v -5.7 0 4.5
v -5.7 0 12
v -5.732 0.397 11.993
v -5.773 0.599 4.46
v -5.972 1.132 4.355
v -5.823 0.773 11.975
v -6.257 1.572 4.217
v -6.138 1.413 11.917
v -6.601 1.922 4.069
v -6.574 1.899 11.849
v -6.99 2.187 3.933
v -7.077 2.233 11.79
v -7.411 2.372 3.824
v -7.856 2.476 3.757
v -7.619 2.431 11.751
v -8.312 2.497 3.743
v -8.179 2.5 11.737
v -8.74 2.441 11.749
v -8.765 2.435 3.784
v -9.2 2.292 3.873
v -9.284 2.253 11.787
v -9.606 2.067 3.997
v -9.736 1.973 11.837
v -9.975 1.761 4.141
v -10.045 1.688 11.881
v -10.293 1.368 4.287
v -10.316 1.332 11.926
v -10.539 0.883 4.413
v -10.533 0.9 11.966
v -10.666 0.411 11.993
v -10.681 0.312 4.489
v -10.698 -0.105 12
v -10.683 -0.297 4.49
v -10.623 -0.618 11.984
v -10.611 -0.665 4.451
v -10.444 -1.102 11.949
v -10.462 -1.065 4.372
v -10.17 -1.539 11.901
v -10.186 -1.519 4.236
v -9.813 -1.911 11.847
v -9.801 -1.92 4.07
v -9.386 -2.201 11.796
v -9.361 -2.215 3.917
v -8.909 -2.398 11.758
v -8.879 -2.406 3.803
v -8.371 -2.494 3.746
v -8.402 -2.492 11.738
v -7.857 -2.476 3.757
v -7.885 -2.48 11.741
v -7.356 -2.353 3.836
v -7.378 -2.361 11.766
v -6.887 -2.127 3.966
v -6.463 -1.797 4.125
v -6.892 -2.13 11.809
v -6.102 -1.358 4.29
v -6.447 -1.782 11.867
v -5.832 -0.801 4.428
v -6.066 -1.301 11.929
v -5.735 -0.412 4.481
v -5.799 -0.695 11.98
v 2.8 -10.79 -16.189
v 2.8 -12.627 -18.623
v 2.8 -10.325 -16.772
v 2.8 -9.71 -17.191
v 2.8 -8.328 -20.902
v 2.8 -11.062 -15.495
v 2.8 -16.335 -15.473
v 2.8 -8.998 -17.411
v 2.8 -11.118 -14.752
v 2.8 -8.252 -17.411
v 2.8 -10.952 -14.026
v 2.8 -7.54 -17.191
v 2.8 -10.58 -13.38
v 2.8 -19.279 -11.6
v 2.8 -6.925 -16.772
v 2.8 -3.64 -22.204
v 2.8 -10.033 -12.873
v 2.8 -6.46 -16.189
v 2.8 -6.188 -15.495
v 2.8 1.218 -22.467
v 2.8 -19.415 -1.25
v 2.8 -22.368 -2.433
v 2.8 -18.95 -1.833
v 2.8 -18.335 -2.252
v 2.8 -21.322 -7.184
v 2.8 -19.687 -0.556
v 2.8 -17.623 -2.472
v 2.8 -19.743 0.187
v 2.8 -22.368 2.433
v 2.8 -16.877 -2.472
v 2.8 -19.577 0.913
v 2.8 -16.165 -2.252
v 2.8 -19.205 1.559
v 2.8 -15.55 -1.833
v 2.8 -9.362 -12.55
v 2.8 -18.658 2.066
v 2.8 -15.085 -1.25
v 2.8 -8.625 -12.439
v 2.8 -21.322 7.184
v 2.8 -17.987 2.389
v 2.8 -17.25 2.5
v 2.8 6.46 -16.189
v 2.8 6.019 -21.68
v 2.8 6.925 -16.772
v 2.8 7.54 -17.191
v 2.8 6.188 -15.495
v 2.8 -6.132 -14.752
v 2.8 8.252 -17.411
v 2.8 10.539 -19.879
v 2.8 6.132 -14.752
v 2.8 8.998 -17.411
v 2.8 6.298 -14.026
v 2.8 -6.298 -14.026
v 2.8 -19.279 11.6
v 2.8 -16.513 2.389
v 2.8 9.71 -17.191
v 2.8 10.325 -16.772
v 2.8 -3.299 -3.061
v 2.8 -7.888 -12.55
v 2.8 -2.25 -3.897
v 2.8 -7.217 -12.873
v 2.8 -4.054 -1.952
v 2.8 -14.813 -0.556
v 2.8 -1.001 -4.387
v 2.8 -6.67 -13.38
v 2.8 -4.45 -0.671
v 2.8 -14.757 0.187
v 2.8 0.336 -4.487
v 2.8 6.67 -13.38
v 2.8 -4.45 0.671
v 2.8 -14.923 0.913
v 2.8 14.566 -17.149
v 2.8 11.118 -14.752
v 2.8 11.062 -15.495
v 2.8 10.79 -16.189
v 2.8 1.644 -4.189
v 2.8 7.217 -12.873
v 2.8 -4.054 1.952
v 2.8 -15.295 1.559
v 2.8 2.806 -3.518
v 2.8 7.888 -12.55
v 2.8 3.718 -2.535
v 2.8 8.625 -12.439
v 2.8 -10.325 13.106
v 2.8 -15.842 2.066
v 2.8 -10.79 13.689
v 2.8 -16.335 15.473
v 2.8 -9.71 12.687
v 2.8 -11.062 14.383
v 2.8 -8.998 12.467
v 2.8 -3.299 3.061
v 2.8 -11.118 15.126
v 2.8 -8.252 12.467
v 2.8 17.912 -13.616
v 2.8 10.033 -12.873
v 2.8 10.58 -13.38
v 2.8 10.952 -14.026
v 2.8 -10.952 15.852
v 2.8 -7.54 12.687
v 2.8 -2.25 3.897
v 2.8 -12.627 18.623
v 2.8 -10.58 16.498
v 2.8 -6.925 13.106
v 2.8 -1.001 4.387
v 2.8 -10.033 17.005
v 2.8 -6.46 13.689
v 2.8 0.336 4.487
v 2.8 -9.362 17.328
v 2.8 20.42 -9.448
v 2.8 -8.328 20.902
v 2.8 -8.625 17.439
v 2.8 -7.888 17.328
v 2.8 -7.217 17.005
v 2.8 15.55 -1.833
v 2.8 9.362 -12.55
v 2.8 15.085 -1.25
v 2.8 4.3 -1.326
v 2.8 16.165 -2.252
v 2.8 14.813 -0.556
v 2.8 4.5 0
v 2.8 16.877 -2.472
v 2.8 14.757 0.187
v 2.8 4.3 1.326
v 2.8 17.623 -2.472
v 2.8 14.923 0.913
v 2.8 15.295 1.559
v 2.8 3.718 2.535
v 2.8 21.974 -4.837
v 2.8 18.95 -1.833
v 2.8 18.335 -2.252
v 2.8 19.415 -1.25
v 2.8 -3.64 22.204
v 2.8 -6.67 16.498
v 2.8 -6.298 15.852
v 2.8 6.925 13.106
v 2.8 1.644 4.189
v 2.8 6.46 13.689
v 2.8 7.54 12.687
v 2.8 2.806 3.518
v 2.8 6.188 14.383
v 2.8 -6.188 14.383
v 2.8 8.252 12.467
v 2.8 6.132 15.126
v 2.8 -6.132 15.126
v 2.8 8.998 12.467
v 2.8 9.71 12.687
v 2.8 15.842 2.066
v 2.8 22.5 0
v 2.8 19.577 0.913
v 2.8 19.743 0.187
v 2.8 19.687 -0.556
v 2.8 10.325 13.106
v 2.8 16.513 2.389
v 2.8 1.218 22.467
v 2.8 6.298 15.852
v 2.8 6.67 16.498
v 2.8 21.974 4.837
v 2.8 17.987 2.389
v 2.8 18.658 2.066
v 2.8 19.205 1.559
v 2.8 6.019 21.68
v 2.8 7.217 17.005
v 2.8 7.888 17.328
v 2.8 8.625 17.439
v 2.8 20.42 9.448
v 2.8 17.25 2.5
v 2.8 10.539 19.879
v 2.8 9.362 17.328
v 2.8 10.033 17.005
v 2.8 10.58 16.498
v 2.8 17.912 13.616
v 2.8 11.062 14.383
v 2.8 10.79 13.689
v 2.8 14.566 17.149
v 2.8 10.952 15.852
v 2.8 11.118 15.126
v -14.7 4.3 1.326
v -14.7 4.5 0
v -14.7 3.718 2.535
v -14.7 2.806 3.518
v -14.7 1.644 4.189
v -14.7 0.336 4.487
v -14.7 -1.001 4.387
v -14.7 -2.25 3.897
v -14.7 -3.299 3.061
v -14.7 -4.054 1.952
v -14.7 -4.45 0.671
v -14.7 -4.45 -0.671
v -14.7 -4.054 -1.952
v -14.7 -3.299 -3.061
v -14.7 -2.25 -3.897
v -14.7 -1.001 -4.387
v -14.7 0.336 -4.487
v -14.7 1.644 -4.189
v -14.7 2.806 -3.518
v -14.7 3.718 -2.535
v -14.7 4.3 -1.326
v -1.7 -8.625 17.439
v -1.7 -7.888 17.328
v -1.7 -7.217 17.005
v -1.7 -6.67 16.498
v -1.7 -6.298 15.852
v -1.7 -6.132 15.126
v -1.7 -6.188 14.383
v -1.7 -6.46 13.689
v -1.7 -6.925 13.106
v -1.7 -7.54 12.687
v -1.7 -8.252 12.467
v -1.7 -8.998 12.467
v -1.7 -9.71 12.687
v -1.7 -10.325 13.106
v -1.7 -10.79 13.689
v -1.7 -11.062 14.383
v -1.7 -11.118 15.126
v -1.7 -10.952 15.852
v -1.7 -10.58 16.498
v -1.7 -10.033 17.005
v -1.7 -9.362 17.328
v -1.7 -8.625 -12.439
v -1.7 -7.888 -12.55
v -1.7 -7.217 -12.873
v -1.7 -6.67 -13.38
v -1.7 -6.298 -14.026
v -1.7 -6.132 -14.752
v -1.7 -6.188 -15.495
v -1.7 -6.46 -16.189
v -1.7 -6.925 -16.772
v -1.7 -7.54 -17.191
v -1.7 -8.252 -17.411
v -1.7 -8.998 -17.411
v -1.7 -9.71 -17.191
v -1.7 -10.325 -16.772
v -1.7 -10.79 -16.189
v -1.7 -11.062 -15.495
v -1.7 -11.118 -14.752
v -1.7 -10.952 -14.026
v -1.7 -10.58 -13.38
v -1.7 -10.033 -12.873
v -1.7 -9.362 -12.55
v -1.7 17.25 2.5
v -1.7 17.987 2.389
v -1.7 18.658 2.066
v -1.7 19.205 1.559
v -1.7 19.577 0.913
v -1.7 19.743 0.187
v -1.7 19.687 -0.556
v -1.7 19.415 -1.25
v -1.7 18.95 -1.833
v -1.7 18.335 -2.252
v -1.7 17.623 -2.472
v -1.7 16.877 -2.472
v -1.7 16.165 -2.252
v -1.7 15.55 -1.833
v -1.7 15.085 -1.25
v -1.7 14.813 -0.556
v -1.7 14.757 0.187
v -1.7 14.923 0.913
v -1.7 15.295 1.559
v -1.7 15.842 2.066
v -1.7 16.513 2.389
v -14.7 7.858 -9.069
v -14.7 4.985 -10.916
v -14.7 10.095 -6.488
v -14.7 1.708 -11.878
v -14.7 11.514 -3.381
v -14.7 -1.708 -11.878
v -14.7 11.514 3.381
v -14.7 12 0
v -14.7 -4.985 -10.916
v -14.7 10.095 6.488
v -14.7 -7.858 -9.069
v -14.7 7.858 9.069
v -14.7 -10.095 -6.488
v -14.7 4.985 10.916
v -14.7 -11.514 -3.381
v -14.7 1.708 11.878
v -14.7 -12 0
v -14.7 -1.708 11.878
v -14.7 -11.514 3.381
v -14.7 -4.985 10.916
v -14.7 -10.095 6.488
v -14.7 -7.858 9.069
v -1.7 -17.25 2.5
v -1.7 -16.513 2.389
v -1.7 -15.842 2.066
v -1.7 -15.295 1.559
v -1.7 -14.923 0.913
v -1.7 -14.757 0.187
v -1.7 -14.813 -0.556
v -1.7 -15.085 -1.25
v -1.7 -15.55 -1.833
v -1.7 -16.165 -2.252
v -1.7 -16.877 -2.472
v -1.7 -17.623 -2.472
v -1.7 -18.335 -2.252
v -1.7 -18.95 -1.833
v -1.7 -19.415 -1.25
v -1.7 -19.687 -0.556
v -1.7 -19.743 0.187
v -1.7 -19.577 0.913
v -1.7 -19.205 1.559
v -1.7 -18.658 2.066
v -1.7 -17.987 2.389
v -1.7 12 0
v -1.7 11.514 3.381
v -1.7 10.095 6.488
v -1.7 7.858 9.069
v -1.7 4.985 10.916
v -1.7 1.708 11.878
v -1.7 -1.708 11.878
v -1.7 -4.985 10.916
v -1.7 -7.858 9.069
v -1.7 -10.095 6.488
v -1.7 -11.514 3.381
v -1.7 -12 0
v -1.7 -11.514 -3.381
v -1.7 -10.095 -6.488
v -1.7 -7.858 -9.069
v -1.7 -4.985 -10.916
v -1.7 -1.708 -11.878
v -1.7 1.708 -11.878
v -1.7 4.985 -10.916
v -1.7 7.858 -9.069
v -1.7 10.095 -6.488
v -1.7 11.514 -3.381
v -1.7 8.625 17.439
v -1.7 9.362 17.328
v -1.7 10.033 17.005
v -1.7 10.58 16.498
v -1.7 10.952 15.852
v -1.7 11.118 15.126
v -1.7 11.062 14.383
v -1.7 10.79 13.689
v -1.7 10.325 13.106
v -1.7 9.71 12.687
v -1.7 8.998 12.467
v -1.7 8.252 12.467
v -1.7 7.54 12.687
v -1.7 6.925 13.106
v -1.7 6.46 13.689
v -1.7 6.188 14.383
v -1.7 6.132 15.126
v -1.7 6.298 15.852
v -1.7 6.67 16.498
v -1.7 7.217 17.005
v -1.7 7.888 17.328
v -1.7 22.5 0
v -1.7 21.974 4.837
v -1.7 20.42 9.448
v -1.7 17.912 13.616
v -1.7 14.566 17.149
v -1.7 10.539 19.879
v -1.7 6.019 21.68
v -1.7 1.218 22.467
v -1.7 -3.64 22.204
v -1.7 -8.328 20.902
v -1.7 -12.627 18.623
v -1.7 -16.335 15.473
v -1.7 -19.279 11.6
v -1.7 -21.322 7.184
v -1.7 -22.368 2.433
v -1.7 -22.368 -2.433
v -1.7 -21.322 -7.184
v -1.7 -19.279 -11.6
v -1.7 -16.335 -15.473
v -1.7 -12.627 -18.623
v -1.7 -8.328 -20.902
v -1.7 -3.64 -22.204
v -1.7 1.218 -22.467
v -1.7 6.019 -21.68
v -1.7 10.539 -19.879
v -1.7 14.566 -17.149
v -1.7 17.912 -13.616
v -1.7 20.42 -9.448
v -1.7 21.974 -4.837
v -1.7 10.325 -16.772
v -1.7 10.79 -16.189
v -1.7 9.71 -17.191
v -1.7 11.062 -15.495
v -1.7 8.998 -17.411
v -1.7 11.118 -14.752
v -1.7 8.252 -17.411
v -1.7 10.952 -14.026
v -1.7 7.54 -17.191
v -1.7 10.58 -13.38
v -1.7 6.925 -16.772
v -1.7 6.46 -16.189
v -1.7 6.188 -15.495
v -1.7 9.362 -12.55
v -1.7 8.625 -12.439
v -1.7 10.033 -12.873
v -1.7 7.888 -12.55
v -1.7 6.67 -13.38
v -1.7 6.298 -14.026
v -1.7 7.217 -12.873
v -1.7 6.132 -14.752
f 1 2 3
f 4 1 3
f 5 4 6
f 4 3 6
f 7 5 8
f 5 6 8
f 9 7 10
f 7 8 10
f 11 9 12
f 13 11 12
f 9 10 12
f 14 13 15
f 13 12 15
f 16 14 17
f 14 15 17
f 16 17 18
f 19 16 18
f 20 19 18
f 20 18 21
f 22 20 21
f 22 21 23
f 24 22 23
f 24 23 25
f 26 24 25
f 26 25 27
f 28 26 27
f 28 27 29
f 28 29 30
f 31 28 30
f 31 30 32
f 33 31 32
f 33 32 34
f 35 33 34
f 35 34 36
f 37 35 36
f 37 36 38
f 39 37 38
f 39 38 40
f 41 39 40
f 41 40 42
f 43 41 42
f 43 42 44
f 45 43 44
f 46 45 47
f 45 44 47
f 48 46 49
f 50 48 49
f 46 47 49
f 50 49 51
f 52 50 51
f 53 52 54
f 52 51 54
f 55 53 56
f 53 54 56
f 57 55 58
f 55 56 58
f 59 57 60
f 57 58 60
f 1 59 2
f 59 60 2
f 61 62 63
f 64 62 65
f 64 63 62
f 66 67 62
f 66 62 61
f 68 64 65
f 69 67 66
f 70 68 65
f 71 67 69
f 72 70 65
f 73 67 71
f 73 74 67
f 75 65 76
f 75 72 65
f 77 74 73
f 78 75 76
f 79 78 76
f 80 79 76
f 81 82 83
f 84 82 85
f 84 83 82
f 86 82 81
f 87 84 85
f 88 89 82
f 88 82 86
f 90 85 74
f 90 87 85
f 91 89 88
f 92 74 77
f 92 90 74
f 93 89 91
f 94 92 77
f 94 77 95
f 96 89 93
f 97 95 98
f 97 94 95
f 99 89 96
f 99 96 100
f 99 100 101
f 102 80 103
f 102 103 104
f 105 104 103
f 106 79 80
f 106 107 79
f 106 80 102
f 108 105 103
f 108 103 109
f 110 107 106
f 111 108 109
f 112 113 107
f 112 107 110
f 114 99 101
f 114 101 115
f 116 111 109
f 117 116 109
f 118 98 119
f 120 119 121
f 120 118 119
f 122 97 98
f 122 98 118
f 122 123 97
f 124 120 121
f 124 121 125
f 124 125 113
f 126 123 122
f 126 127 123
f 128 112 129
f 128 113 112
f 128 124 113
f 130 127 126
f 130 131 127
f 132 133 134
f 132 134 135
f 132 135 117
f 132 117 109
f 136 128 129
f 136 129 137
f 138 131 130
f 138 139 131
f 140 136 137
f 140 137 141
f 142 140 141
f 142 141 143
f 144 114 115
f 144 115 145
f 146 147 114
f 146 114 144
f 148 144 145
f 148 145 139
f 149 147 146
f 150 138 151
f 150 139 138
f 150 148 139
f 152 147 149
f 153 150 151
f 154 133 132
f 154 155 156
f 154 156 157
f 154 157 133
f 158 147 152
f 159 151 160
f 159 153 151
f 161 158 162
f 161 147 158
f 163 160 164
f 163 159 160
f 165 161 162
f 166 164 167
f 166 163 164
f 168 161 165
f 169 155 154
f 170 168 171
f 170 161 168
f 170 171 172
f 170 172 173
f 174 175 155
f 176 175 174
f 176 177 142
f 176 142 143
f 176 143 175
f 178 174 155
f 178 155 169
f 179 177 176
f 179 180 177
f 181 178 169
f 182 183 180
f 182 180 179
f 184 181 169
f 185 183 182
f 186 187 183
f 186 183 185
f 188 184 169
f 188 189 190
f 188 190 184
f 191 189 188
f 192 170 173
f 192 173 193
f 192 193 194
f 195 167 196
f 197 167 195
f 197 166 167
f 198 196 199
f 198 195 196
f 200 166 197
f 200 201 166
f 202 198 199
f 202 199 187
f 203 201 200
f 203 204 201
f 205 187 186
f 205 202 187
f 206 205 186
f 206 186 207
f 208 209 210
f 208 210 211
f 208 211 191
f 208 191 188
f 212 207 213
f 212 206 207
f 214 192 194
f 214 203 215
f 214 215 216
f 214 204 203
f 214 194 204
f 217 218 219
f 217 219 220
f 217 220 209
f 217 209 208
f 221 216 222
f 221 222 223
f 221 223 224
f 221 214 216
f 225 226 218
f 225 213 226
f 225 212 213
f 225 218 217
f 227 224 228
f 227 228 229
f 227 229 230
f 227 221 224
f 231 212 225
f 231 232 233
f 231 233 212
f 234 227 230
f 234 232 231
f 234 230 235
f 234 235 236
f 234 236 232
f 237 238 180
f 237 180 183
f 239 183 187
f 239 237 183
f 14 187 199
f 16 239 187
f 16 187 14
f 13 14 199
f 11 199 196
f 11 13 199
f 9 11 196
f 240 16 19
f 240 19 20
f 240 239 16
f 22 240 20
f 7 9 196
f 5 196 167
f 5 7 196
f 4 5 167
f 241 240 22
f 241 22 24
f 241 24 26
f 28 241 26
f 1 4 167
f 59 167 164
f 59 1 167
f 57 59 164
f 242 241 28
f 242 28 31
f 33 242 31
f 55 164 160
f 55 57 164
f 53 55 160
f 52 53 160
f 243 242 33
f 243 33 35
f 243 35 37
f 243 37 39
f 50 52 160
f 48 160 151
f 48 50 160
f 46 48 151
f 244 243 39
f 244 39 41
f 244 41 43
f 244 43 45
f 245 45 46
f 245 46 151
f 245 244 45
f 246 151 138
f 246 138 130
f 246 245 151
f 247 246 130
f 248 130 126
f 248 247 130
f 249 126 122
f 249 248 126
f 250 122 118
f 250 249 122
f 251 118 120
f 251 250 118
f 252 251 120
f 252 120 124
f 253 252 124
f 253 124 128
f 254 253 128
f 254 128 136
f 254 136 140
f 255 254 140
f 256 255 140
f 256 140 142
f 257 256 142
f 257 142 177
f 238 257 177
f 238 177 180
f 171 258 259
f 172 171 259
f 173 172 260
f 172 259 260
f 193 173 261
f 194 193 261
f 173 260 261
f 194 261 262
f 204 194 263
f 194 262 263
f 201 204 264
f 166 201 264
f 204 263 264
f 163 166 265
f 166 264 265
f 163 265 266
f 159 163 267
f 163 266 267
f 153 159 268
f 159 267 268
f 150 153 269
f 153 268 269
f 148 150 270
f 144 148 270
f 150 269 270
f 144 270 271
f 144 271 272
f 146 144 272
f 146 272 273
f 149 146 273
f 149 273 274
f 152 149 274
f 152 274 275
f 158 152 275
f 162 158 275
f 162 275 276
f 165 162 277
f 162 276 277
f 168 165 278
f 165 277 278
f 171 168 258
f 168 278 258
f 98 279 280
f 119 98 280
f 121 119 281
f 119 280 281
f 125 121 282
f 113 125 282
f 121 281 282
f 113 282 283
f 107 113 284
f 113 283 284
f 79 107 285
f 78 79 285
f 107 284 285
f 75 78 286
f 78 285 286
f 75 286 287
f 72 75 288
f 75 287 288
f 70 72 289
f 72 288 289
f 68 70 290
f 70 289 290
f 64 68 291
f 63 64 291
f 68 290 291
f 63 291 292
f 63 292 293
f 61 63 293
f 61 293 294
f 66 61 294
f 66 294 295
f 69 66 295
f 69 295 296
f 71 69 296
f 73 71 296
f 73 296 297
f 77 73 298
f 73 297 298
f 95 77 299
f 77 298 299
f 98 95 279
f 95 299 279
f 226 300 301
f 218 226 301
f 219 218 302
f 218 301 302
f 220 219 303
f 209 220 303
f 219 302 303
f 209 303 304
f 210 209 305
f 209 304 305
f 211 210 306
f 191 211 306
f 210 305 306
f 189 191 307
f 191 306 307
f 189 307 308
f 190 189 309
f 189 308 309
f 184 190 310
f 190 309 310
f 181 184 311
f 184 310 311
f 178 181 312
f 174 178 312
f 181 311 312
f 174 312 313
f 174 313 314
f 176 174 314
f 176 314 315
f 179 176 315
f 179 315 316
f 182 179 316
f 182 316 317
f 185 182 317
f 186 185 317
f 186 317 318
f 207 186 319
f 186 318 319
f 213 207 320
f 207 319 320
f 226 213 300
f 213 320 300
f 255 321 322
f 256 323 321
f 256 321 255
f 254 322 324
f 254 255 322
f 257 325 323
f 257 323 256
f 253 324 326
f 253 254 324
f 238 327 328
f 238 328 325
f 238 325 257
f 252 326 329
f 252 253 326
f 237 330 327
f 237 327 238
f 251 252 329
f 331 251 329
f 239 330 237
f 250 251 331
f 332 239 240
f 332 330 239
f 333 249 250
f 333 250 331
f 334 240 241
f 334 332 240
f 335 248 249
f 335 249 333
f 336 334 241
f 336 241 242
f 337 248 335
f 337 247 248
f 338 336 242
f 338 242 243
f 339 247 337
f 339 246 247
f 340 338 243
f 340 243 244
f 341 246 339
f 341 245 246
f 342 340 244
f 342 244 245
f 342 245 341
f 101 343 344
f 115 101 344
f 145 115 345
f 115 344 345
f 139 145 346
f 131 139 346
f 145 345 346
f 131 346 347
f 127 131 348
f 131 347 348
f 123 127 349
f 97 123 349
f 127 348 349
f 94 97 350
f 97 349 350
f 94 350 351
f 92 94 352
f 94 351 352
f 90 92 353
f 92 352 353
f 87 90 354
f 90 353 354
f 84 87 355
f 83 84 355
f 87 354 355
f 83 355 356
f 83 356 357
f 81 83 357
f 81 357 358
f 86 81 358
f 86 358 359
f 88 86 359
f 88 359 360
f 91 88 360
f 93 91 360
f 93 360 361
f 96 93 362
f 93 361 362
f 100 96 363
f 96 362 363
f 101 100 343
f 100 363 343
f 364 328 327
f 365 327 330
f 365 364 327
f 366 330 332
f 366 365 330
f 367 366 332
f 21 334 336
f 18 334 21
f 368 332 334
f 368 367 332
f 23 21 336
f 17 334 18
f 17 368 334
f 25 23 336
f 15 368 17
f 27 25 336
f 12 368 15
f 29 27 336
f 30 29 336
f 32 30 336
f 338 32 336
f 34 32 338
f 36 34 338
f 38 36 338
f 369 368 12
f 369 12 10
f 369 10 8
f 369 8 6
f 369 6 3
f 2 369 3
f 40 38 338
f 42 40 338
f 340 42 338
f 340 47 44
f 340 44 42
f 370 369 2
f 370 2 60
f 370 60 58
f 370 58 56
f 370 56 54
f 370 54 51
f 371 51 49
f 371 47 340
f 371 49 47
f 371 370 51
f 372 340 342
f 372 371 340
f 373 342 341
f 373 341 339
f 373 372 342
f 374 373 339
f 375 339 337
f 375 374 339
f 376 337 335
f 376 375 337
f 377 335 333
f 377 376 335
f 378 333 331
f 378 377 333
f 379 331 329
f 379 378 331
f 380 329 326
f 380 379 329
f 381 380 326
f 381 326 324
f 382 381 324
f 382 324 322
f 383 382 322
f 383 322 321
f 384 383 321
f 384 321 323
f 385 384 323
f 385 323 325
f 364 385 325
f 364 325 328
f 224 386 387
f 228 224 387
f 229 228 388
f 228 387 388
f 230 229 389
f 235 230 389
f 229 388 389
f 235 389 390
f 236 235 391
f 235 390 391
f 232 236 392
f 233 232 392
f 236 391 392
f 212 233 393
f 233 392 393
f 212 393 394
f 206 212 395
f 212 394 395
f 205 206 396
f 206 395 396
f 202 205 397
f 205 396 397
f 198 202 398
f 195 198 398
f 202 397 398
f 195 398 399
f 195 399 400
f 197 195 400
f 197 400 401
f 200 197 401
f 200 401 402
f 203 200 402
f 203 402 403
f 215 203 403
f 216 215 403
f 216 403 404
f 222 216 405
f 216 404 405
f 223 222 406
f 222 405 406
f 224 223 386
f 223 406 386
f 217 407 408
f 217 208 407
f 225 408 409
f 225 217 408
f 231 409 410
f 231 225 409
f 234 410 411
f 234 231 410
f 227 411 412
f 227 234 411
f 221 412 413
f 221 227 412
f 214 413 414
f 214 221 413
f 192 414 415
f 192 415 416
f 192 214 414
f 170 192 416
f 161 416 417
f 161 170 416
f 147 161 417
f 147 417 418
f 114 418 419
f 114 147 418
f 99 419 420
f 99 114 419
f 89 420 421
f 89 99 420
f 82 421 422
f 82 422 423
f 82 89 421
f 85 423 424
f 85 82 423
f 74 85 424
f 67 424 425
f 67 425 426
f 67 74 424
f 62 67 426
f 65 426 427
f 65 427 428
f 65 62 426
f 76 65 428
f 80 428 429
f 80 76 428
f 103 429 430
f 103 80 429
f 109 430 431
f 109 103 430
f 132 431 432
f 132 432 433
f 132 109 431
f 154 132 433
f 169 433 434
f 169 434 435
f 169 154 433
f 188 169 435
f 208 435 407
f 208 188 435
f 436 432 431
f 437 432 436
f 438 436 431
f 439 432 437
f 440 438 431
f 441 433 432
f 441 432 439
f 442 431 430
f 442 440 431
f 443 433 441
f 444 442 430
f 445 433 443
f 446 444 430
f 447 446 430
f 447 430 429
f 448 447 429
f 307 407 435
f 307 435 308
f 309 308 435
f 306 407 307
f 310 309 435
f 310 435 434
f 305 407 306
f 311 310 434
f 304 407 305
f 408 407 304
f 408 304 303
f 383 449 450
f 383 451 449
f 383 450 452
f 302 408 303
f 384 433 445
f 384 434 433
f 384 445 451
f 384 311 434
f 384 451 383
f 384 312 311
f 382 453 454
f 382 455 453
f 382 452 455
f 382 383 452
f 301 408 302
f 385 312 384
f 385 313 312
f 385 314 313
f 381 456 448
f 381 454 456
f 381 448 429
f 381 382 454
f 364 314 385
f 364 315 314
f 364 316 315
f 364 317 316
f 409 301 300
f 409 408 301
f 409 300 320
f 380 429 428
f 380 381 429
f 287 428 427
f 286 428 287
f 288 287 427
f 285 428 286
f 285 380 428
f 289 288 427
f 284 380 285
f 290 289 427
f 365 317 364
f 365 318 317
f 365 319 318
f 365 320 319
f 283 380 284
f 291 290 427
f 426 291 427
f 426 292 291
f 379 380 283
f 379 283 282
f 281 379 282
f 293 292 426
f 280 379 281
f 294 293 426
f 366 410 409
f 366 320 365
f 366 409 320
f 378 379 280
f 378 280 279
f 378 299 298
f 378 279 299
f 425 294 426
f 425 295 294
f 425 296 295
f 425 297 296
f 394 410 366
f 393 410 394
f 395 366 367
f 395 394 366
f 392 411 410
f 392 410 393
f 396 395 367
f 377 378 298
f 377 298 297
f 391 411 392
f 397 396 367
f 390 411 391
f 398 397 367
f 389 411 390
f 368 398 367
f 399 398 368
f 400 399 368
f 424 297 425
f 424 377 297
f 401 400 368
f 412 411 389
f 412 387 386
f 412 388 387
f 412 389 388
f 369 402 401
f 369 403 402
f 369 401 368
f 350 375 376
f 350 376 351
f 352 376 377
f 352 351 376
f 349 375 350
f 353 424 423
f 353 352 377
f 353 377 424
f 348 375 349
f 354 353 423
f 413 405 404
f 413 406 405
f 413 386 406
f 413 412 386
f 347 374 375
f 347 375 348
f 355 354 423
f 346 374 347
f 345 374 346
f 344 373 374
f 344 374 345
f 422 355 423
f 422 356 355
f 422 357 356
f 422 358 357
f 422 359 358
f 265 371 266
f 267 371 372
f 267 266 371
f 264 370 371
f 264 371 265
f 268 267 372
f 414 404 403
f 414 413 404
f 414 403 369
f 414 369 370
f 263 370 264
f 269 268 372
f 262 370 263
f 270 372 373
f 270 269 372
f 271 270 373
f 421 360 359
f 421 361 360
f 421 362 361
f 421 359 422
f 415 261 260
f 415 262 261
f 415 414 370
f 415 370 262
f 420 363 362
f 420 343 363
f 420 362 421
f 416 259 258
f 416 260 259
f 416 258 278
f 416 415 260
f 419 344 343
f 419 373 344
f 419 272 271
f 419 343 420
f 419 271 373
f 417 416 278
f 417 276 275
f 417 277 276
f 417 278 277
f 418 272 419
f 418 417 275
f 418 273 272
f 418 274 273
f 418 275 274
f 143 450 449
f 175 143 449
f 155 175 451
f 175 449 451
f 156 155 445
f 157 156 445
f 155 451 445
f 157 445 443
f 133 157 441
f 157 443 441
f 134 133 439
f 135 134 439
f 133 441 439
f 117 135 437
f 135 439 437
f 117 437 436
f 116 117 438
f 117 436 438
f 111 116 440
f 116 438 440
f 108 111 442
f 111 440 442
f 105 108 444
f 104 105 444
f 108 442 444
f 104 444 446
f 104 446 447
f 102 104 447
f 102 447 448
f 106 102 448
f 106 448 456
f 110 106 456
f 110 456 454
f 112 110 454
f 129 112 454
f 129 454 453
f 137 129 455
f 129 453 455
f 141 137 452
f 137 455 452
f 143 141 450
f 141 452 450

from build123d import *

# Parameters (mm, degrees)
SKETCH2_R          = 2.5
CUT_EXTRUDE1_DEPTH = 4.5
CUT_EXTRUDE2_REACH = 36.5
SKETCH3_R          = 2.5


with BuildPart() as part:
    # Sketch1 → Revolve1 (revolve)
    with BuildSketch(Plane.XY):
        Polygon((-14.700460829, 4.5), (-14.700460829, 12), (-1.700460829, 12), (-1.700460829, 22.5), (2.799539171, 22.5), (2.799539171, 4.5), align=None)
    revolve(axis=Axis((-11.612903226, 0, 0), (1, 0, 0)))

    # Sketch2 → Cut-Extrude1 (cut)
    with BuildSketch(Plane.ZY.offset(1.700460829)):
        with Locations((0, 17.25)):
            Circle(SKETCH2_R)
        with Locations((14.938938215, 8.625)):
            Circle(SKETCH2_R)
        with Locations((14.938938215, -8.625)):
            Circle(SKETCH2_R)
        with Locations((0, -17.25)):
            Circle(SKETCH2_R)
        with Locations((-14.938938215, -8.625)):
            Circle(SKETCH2_R)
        with Locations((-14.938938215, 8.625)):
            Circle(SKETCH2_R)
    extrude(amount=-CUT_EXTRUDE1_DEPTH, mode=Mode.SUBTRACT)

    # Sketch3 → Cut-Extrude2 (cut, up to next)
    with BuildSketch(Plane.XY.offset(12), mode=Mode.PRIVATE) as cut_extrude2_sk1:
        with Locations((-8.200460829, 0)):
            Circle(SKETCH3_R)
    cut_extrude2_tool1 = extrude(cut_extrude2_sk1.sketch, amount=-CUT_EXTRUDE2_REACH, mode=Mode.PRIVATE) & part.part
    add(cut_extrude2_tool1.solids().sort_by_distance((-8.200461, 0, 12))[0], mode=Mode.SUBTRACT)


solid = part.part
